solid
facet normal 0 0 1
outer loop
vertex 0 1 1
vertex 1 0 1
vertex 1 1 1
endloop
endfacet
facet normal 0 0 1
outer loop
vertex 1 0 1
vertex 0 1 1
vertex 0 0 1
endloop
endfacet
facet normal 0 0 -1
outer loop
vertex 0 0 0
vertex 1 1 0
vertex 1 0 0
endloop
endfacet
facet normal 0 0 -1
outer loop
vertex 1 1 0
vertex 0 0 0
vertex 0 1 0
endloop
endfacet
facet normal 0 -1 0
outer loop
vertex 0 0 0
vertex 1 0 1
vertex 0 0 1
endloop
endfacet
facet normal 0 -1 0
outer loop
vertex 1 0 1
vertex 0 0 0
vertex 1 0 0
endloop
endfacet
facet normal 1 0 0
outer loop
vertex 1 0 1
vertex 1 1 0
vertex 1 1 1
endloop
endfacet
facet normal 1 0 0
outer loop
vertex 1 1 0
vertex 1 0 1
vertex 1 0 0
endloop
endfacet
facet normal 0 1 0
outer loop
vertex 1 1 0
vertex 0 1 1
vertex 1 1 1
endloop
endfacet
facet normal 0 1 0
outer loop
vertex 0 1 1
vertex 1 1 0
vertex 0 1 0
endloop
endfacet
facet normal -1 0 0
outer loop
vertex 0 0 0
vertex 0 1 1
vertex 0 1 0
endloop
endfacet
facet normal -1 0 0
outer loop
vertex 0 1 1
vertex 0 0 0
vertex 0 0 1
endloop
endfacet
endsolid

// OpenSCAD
// file: ../source/rm_common.scad
// RobotMind: solid, double-sided panels with one blind mounting interface.
// One port does two jobs: press-fit peg (carriers) or bolted joint via an
// M3 brass heat-set insert (links). All dimensions are millimetres.
$fn = 32;

RM_EPS = 0.1;
RM_UNIT = 40;
RM_GRID = 10;
RM_EDGE_MARGIN = RM_GRID/2;
RM_PANEL_T = 8;
RM_CORNER_R = 3;
RM_FIT = 0; // positive is looser; tune in 0.05 mm steps

// One hexagonal blind port. The hexagonal ring accepts a tool-free peg; the
// central bore seats an M3 brass heat-set insert for bolted links.
RM_PORT_OD = 8;       // hexagon corner-to-corner
RM_PORT_DEPTH = 2.2;  // hex ring depth
RM_INSERT_OD = 4.0;   // M3 brass knurled heat-set insert, outer diameter
RM_INSERT_BORE = 3.4; // printed blind bore for the insert (melt-press fit)
RM_INSERT_DEPTH = 3.0;// blind bore depth; 2x this must stay under panel thickness
RM_PEG_BORE = RM_INSERT_OD+0.2; // peg centre bore clears a seated insert
RM_PEG_ENTRY = 0.2;
RM_PEG_GRIP = 0.2;

RM_M3_CLEARANCE = 3.4;
RM_M3_HEAD_D = 6.2;
RM_M3_HEAD_DEPTH = 2;

// Bolted links. Brackets screw into heat-set inserts seated in panel ports.
RM_LINK_T = 4;   // bracket thickness
RM_LINK_W = 24;  // bracket width across the seam
RM_LINK_ROW = RM_GRID/2;                       // flat rows: 5 mm off the seam
RM_CORNER_ROW = RM_UNIT/2-RM_PANEL_T-RM_EDGE_MARGIN; // 7: fold to first row

function rm_port_od() = RM_PORT_OD+2*RM_FIT;
function rm_insert_bore() = RM_INSERT_BORE+2*RM_FIT;
function rm_peg_root_od(delta=0) = RM_PORT_OD+RM_PEG_GRIP-2*RM_FIT+delta;
function rm_peg_tip_od(delta=0) = RM_PORT_OD-RM_PEG_ENTRY-2*RM_FIT+delta;

function grid_count(span) = floor((span-2*RM_EDGE_MARGIN)/RM_GRID)+1;
function grid_position(i,span) = -span/2+RM_EDGE_MARGIN+i*RM_GRID;
function link_cols(length) =
  [for(k=[0:length/RM_UNIT-1]) RM_GRID/2+2*RM_GRID*k];
function link_hole_xs(length) =
  [for(x=link_cols(length), t=[-1,1]) t*x];

assert(RM_UNIT%RM_GRID == 0, "The unit must contain a whole mounting grid");
assert(grid_count(RM_UNIT) == 4,
       "The 40 mm unit must expose a 4x4 port grid");
assert(RM_PANEL_T-RM_INSERT_DEPTH >= RM_INSERT_DEPTH,
       "Opposed face insert bores must not meet through the membrane");
assert(RM_PANEL_T-RM_INSERT_DEPTH >= 2,
       "Blind insert bore needs a continuous membrane");
assert(RM_INSERT_BORE >= RM_M3_CLEARANCE,
       "Insert bore must clear the M3 shaft");
assert(RM_PEG_BORE > RM_INSERT_OD, "Peg bore must clear a seated insert");
assert(rm_peg_root_od() > rm_port_od() &&
       rm_port_od() > rm_peg_tip_od(),
       "RM_FIT is outside the hexagonal peg range");
assert(RM_GRID-RM_PORT_OD > 1,
       "Mounting ports need enough material between them");
assert(RM_PORT_OD > RM_INSERT_BORE+3,
       "Hex ring needs walls around the insert bore");

module rounded_box(size=[20,20,3], r=2) {
  linear_extrude(height=size[2])
    offset(r=r) offset(delta=-r) square([size[0],size[1]]);
}

module rounded_panel(size=[RM_UNIT,RM_UNIT], t=RM_PANEL_T,
                     r=RM_CORNER_R) {
  translate([-size[0]/2,-size[1]/2,0]) rounded_box([size[0],size[1],t],r);
}

// Cut from a face at Z=0 into material extending in +Z. One blind port:
// hexagonal ring for the press-fit peg, central bore as insert seat.
module blind_port_cut(depth=RM_PORT_DEPTH,
                      bore_d=rm_insert_bore(),
                      bore_depth=RM_INSERT_DEPTH) {
  union() {
    translate([0,0,-RM_EPS])
      cylinder(h=depth+RM_EPS,d=rm_port_od(),$fn=6);
    translate([0,0,-RM_EPS])
      cylinder(h=bore_depth+RM_EPS,d=bore_d);
  }
}

module face_port_cuts(size=[RM_UNIT,RM_UNIT], top=false) {
  for(ix=[0:grid_count(size[0])-1], iy=[0:grid_count(size[1])-1]) {
    p=[grid_position(ix,size[0]),grid_position(iy,size[1])];
    if(top)
      translate([p[0],p[1],RM_PANEL_T]) mirror([0,0,1]) blind_port_cut();
    else
      translate([p[0],p[1],0]) blind_port_cut();
  }
}

module panel(size=[RM_UNIT,RM_UNIT]) {
  assert(size[0]%RM_UNIT == 0 && size[1]%RM_UNIT == 0,
         "Panel dimensions must be whole 40 mm units");
  difference() {
    rounded_panel(size);
    face_port_cuts(size);
    face_port_cuts(size,true);
  }
}

// Every carrier reuses this exact integral peg: solid hex frustum with a
// centre bore that clears a seated insert and passes an M3 screw.
module mount_peg(delta=0, h=RM_PORT_DEPTH) {
  difference() {
    cylinder(h=h,
             d1=rm_peg_root_od(delta),d2=rm_peg_tip_od(delta),$fn=6);
    translate([0,0,-RM_EPS])
      cylinder(h=h+2*RM_EPS,d=RM_PEG_BORE);
  }
}

// Cut from an exposed surface at Z=0 into material extending in +Z.
module optional_screw_cut(depth=RM_PANEL_T) {
  translate([0,0,-RM_EPS])
    cylinder(h=depth+2*RM_EPS,d=RM_M3_CLEARANCE);
  translate([0,0,-RM_EPS])
    cylinder(h=RM_M3_HEAD_DEPTH+RM_EPS,d=RM_M3_HEAD_D);
}

// Bolted links. Both print flat, features up, support-free; screw heads sit
// proud of the bracket (no counterbore). Rows land on the seam-adjacent port
// rows; columns repeat every 20 mm along the seam.

// One M3 pass-through hole: shaft clearance, drilled right through a 4 mm
// bracket in +Z, or in +Y for the fold leg of an angle link.
module link_bolt_hole(x, y, up=true) {
  if(up) translate([x,y,-RM_EPS])
    cylinder(h=RM_LINK_T+2*RM_EPS,d=RM_M3_CLEARANCE);
  else translate([x,y,0]) rotate([90,0,0])
    cylinder(h=RM_LINK_T+2*RM_EPS,d=RM_M3_CLEARANCE);
}

// flat_link(length): bridges a coplanar seam. Holes at +/-5 mm off the
// seam line (the two seam-adjacent port rows of each panel).
module flat_link(length=RM_UNIT) {
  assert(length%RM_UNIT == 0, "Link length must use 40 mm units");
  difference() {
    translate([-length/2,-RM_LINK_W/2,0])
      rounded_box([length,RM_LINK_W,RM_LINK_T],3);
    for(x=link_hole_xs(length), y=[-RM_LINK_ROW,RM_LINK_ROW])
      link_bolt_hole(x,y);
  }
}

// angle_link(length): a 90-degree bracket for box corners. The fold line
// sits at the inner corner; the floor leg extends -Y, the wall leg +Z, so
// holes land on the first two free port rows of each panel.
module angle_link(length=RM_UNIT) {
  assert(length%RM_UNIT == 0, "Link length must use 40 mm units");
  ys=[-RM_CORNER_ROW-RM_GRID, -RM_CORNER_ROW];
  difference() {
    union() {
      translate([-length/2,-RM_LINK_W,0])
        rounded_box([length,RM_LINK_W,RM_LINK_T],3);
      translate([-length/2,-RM_LINK_T,0]) rotate([90,0,0])
        rounded_box([length,RM_LINK_W,RM_LINK_T],3);
    }
    for(x=link_hole_xs(length), y=ys, up=[true,false])
      link_bolt_hole(x,y,up=up);
  }
}
// main file
// Grid alignment check: no hand-written positions. Every designed hole must
// land on a panel port centre. Assertions fail loudly at compile time.
include <../source/rm_common.scad>

function grid_positions(span) = [for(i=[0:grid_count(span)-1]) grid_position(i,span)];
function contains(haystack, needle) = [for(h=haystack) h==needle] != [];
function off_grid(positions, holes) = [for(h=holes) if(!contains(positions,h)) h];

// Link columns run across the wall; rows run perpendicular toward the seam.
// A 40 mm link lives on a 40 mm panel, an 80 mm link on an 80 mm span.
assert(off_grid(grid_positions(40), link_hole_xs(40)) == [],
       "40 mm link holes off the 40 mm port grid");
assert(off_grid(grid_positions(80), link_hole_xs(80)) == [],
       "80 mm link holes off the 80 mm port grid");

// Flat pairs join at the panel seam; the two link rows sit at +/-RM_LINK_ROW
// off the seam, which is the first free port row of each panel in a pair.
pair_rows = concat(grid_positions(40),
                   [for(y=grid_positions(40)) y+RM_UNIT]);
off_pair = [for(y=[RM_UNIT/2-RM_LINK_ROW,RM_UNIT/2+RM_LINK_ROW])
              if(!contains(pair_rows,y)) y];
assert(off_pair == [], "Flat link row misses the seam-adjacent port row");

// Angle link rows: RM_CORNER_ROW and one full grid pitch out from the fold.
corner_rows = [RM_CORNER_ROW, RM_CORNER_ROW+RM_GRID];
assert(corner_rows[1]-corner_rows[0] == RM_GRID,
       "Angle link rows must be exactly one grid pitch apart");

// A trivial solid so the test edits as a valid render when asserts pass.
cube([1,1,1]);
